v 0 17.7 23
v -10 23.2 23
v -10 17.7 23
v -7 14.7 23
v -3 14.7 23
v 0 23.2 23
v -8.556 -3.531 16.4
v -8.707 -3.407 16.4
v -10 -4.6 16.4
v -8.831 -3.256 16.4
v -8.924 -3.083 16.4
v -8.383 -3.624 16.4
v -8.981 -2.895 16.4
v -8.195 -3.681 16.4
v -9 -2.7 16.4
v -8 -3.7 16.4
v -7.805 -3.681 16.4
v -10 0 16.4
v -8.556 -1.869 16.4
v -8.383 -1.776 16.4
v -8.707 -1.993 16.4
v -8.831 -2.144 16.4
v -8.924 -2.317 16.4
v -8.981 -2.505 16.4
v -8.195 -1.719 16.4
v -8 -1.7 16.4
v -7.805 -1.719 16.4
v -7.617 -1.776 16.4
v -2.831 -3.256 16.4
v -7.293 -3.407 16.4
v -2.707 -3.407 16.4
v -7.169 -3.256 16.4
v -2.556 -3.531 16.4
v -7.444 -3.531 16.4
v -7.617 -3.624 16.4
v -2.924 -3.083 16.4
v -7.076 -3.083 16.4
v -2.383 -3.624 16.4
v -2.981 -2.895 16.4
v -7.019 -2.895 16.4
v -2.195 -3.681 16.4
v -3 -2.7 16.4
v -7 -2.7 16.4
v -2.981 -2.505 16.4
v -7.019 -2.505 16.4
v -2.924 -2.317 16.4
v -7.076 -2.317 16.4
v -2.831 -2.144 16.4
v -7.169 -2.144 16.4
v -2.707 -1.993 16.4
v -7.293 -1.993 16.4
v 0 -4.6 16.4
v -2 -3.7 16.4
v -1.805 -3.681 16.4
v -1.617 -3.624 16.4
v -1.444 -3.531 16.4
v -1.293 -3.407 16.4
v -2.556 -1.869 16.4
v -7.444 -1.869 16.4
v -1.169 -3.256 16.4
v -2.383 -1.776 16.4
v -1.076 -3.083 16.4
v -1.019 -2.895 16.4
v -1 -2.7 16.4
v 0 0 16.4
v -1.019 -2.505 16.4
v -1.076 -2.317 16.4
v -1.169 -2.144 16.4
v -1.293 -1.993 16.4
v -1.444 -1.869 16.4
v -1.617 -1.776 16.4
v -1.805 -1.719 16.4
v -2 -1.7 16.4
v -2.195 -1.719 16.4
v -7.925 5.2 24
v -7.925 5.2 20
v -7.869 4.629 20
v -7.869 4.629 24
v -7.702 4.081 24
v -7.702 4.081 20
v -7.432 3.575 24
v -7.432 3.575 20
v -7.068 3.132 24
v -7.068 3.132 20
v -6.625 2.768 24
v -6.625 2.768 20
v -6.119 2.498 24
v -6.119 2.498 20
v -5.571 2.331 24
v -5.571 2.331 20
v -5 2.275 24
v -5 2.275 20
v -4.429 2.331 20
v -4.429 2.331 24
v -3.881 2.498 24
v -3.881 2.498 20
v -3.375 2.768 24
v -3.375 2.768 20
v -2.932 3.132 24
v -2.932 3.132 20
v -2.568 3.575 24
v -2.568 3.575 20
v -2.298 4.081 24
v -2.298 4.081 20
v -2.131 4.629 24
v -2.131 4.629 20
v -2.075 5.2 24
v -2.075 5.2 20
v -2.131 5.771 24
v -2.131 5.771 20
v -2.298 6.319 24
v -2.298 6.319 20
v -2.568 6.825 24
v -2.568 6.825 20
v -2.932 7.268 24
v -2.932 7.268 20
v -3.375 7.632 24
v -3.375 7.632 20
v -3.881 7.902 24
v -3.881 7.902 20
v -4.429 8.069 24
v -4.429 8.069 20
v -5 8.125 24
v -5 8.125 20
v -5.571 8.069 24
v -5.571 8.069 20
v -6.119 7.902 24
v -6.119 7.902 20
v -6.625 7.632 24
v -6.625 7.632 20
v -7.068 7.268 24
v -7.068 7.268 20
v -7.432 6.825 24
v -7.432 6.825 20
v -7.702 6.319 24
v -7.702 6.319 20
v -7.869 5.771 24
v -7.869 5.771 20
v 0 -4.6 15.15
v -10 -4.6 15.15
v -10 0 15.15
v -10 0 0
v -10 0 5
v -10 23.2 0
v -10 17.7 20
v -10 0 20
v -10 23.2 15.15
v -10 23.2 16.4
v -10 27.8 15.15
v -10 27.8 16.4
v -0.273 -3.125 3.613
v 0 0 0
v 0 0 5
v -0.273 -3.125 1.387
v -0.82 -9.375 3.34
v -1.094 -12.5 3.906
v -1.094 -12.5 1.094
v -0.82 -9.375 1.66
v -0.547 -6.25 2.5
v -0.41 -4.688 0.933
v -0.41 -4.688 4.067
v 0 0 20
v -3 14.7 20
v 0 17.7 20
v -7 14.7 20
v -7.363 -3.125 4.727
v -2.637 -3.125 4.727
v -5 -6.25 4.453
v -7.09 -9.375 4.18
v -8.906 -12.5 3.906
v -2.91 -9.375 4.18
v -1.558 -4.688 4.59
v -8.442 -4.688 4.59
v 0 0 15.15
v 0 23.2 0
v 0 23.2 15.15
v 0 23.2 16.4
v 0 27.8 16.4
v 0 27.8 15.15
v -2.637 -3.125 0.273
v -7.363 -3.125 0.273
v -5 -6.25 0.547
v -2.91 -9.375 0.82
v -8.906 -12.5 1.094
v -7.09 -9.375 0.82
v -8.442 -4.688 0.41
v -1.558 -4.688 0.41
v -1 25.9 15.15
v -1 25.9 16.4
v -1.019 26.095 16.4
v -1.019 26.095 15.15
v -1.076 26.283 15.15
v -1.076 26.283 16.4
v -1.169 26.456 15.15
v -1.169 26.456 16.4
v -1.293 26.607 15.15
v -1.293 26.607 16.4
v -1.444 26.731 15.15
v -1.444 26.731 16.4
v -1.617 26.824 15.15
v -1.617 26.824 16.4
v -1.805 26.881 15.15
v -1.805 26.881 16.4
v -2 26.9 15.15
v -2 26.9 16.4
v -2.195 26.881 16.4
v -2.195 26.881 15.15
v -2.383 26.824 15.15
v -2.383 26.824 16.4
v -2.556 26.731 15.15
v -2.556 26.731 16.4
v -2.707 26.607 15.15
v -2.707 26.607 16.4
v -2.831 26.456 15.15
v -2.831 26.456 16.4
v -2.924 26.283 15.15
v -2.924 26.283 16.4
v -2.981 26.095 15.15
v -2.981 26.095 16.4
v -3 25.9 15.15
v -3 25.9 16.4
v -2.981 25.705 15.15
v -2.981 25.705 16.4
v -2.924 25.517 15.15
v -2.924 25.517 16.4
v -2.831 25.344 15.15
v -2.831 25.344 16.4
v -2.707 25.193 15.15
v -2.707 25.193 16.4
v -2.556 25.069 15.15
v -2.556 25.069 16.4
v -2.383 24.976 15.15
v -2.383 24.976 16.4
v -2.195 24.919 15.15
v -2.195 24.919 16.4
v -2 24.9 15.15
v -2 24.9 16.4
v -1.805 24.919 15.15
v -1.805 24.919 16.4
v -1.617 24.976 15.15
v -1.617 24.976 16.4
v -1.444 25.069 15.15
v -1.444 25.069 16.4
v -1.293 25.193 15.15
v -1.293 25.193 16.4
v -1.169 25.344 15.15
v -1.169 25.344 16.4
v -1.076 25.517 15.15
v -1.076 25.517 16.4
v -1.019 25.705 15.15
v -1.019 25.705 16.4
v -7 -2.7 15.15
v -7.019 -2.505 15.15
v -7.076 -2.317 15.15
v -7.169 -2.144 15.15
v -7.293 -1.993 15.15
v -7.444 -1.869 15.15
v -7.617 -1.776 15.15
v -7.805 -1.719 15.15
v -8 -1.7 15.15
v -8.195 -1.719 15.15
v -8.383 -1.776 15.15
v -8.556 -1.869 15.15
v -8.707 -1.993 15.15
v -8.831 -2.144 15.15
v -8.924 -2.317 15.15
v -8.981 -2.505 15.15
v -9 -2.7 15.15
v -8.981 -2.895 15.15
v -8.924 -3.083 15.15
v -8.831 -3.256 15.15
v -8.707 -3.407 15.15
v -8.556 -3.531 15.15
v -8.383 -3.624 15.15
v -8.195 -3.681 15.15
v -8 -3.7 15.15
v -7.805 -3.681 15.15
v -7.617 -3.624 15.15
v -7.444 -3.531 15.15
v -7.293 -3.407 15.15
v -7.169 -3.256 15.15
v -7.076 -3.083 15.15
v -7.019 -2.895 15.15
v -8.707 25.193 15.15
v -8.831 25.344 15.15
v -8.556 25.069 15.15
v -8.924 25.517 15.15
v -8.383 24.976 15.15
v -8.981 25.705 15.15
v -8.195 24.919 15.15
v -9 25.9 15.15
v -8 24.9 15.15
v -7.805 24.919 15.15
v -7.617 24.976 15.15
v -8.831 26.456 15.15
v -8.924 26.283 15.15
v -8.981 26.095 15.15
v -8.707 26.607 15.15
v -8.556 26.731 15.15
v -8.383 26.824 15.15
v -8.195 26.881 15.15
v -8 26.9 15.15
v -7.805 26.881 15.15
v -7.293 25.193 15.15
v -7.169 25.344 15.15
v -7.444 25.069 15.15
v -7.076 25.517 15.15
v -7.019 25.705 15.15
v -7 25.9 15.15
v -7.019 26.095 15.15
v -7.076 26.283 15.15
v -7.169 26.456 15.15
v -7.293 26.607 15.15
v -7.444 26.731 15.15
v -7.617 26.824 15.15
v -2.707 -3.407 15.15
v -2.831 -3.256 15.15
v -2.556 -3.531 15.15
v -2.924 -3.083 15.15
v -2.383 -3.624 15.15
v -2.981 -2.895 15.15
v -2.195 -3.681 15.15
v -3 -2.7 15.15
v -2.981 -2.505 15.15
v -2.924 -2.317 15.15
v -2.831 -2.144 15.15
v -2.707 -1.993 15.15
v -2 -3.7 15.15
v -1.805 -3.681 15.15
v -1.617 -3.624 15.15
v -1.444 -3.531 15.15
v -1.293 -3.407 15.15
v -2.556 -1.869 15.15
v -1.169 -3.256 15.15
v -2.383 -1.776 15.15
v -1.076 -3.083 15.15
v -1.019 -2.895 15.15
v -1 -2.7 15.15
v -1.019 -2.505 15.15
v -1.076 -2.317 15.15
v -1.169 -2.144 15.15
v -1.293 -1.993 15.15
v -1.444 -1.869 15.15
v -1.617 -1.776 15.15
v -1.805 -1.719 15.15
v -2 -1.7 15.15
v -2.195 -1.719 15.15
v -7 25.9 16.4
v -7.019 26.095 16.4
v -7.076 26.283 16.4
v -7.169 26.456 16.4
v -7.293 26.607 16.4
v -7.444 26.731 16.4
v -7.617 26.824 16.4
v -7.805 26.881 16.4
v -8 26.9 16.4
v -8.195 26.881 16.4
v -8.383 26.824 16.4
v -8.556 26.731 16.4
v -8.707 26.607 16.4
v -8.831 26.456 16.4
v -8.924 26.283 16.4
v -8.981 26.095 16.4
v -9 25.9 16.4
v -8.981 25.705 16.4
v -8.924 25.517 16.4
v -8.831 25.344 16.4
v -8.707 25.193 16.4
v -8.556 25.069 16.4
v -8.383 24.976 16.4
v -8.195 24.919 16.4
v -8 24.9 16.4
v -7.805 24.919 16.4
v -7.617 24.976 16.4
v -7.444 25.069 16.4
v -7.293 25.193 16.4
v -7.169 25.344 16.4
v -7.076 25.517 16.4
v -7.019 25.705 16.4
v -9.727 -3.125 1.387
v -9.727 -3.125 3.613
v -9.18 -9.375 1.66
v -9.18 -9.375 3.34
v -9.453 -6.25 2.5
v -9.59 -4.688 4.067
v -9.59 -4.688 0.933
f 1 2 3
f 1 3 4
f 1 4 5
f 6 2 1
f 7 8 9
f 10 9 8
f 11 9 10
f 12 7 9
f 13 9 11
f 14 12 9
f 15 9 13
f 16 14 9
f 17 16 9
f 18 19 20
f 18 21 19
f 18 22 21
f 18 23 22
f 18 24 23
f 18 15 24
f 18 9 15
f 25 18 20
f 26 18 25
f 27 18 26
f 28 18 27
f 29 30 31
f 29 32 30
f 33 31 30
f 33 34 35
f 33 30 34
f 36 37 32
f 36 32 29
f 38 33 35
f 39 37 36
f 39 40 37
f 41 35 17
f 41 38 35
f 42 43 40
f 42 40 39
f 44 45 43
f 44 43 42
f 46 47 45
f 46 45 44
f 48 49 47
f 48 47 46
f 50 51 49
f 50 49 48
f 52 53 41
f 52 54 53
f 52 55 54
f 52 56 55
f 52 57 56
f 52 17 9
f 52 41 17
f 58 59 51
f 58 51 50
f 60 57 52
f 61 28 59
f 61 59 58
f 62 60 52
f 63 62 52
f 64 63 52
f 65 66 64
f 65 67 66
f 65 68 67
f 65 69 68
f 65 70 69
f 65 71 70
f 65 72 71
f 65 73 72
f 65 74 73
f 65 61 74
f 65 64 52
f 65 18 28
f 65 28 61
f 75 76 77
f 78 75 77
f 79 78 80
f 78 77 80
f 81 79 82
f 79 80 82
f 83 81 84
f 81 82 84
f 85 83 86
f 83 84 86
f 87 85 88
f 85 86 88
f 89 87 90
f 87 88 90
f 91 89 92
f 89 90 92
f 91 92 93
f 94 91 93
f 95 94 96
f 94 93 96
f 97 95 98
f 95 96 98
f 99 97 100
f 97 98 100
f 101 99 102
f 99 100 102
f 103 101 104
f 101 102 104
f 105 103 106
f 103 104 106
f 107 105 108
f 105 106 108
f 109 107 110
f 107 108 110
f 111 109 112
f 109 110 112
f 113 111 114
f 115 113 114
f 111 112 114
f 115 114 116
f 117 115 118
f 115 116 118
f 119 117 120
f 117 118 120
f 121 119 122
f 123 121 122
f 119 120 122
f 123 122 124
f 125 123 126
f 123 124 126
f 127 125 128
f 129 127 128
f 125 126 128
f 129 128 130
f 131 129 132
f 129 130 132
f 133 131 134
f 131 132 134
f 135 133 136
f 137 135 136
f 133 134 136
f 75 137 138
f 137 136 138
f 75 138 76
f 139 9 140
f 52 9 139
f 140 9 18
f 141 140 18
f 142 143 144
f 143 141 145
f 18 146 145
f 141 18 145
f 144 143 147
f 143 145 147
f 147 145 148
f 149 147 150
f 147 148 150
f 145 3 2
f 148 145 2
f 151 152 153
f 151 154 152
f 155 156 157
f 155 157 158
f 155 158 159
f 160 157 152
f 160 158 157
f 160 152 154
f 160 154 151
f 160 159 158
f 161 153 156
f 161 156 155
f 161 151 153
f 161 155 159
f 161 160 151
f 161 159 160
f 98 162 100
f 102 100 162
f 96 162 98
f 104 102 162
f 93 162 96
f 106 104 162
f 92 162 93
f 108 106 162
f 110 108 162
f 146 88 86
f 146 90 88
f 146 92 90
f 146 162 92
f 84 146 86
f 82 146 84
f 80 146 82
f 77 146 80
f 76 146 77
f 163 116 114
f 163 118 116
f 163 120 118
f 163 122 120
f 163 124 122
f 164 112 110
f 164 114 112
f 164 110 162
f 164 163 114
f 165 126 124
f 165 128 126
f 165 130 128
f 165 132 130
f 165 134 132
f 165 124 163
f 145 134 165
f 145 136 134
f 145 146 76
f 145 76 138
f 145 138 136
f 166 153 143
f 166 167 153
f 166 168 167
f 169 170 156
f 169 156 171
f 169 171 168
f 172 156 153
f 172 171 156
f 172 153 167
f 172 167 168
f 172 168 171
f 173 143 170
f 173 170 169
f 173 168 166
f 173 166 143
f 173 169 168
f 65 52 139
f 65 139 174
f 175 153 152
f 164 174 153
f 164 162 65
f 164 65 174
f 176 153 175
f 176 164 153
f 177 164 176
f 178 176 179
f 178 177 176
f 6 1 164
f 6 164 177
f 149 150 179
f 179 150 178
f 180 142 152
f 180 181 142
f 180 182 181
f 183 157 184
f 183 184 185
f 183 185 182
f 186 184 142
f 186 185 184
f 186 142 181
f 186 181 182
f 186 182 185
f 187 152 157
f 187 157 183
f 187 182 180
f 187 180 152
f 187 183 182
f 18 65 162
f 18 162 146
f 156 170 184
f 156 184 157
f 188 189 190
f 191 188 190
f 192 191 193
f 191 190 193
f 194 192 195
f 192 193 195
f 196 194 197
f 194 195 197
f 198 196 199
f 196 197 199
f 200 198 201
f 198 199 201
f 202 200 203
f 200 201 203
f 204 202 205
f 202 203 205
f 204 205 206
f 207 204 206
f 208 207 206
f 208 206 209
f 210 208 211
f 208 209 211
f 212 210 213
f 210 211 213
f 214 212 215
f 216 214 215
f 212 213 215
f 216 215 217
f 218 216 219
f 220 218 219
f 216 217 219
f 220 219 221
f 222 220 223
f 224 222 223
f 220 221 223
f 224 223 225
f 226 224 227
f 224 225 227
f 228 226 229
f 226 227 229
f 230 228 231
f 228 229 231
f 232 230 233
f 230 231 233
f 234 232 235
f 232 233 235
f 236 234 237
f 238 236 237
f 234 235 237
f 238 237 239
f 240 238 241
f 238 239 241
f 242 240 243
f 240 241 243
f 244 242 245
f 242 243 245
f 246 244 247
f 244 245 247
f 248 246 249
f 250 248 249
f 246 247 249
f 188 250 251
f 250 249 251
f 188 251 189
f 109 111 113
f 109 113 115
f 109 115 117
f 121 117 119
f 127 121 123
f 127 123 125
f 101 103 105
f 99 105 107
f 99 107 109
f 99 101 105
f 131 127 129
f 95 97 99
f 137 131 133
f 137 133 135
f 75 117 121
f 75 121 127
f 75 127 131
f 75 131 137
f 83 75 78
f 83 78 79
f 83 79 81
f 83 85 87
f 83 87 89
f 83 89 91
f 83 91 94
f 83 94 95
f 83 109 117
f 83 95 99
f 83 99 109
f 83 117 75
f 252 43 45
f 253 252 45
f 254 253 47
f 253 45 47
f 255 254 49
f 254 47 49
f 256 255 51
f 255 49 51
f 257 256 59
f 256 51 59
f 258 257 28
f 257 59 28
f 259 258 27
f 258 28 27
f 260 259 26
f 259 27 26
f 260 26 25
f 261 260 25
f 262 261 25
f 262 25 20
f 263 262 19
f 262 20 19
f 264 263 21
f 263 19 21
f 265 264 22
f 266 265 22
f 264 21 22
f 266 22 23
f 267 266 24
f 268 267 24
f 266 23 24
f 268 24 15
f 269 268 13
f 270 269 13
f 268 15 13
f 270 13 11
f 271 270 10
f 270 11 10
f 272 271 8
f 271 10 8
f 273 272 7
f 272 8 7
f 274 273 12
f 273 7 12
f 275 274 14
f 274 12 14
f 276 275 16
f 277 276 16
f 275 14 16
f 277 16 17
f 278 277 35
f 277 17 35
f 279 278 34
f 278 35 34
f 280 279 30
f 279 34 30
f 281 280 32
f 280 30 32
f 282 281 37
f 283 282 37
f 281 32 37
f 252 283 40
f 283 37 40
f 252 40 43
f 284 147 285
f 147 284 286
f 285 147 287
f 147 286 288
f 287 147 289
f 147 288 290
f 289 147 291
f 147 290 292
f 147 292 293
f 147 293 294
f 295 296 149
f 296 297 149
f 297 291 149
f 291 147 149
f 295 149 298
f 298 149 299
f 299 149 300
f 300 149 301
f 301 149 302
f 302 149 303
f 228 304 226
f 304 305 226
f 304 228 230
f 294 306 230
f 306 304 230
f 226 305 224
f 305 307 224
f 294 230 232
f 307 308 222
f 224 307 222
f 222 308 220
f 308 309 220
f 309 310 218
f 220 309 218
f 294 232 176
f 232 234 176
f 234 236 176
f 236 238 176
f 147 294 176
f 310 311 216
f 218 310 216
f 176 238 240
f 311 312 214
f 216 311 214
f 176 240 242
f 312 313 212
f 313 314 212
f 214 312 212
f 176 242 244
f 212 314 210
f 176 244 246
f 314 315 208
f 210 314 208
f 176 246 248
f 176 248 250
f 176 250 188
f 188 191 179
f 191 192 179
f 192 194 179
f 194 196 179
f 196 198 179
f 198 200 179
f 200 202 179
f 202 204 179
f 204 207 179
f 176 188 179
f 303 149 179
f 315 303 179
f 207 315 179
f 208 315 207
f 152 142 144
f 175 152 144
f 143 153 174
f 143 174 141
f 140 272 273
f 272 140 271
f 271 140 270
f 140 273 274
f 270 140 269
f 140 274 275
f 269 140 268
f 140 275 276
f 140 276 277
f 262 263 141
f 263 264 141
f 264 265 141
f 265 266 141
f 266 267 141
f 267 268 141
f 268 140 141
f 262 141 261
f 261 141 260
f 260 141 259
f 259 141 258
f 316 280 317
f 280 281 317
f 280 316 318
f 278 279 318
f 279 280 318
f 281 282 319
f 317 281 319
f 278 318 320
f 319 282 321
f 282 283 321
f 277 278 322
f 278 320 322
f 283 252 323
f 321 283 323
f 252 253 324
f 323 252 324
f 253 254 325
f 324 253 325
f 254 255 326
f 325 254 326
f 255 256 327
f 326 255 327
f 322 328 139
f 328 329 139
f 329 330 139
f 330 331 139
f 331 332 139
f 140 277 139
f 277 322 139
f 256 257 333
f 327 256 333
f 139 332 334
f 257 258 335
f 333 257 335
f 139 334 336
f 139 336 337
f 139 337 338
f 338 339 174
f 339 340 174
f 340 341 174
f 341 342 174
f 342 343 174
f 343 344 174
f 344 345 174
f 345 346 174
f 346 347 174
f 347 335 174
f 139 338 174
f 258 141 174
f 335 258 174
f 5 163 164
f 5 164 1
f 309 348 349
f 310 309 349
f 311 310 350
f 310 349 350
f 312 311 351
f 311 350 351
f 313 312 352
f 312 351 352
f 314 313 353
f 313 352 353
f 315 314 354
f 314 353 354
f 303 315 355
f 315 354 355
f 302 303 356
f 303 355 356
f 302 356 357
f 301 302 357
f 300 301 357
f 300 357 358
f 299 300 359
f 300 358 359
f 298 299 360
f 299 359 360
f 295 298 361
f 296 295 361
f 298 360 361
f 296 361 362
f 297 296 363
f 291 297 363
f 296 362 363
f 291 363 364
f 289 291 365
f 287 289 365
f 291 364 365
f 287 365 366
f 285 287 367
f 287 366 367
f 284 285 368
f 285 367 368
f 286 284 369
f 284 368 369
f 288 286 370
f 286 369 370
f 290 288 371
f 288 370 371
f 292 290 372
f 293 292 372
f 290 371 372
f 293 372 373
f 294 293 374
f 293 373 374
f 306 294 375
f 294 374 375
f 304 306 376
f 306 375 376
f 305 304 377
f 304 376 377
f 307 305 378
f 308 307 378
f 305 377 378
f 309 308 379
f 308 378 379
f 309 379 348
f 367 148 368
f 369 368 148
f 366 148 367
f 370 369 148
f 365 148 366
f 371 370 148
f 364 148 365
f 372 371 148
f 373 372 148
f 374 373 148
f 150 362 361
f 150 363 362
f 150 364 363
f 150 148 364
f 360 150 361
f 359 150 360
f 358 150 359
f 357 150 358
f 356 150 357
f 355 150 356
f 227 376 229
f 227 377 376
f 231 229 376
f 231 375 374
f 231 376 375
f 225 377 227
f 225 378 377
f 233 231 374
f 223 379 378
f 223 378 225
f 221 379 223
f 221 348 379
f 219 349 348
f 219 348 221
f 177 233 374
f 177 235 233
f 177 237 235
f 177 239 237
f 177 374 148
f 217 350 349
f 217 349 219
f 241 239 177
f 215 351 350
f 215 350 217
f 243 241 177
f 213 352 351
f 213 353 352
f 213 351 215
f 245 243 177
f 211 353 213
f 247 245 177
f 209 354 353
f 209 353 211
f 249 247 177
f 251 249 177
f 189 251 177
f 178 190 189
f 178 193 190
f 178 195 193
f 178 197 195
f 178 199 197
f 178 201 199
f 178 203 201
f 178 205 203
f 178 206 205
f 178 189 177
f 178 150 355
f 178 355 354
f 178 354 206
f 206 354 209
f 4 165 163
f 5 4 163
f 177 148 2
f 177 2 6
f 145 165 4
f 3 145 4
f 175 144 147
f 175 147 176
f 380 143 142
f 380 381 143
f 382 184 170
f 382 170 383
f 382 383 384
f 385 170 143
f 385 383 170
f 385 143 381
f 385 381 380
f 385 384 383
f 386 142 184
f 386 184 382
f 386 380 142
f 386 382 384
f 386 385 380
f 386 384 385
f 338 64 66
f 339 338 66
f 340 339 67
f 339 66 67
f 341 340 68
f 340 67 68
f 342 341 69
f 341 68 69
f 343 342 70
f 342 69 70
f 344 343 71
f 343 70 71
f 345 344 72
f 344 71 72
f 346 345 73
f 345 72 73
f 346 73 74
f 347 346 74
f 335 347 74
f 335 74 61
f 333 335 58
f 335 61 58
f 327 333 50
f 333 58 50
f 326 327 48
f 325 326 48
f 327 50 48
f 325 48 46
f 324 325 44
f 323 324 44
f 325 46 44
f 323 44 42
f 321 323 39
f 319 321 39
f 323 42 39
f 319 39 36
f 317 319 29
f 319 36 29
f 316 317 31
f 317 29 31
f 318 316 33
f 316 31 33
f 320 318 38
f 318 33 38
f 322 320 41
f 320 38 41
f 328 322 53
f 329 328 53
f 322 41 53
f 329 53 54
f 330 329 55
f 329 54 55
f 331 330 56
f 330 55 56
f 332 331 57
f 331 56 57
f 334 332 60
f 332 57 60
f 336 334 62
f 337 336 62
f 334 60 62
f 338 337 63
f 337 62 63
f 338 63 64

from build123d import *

# Parameters (mm, degrees)
SKETCH1_W           = 23.2
SKETCH1_H           = 10
BOSS_EXTRUDE1_DEPTH = 20
SKETCH2_W           = 10
SKETCH2_H           = 8.5
BOSS_EXTRUDE2_DEPTH = 3
CHAMFER1_SIZE       = 3
SKETCH3_R           = 2.925
BOSS_EXTRUDE3_DEPTH = 4
BOSS_EXTRUDE4_START = -3.6
SKETCH5_W           = 10
SKETCH5_H           = 32.4
BOSS_EXTRUDE4_DEPTH = 1.25
SKETCH6_R           = 1
CUT_EXTRUDE1_DEPTH  = 1.25
SKETCH7_W           = 10
SKETCH7_H           = 5
BOSS_EXTRUDE5_DEPTH = 12.5
BOSS_EXTRUDE5_TAPER = 5


with BuildPart() as part:
    # Sketch1 → Boss-Extrude1 (new body)
    with BuildSketch(Plane(origin=(0, 0, 0), x_dir=(0, 1, 0), z_dir=(0, 0, 1))):
        with Locations((11.6, 5)):
            Rectangle(SKETCH1_W, SKETCH1_H)
    extrude(amount=BOSS_EXTRUDE1_DEPTH)

    # Sketch2 → Boss-Extrude2 (add)
    with BuildSketch(Plane.XY.offset(20)):
        with Locations((-5, 18.95)):
            Rectangle(SKETCH2_W, SKETCH2_H)
    extrude(amount=BOSS_EXTRUDE2_DEPTH)

    # Chamfer1
    chamfer1_edges = [part.edges().sort_by_distance(p)[0] for p in [
        (-10, 14.7, 21.5),
        (0, 14.7, 21.5),
    ]]
    chamfer(chamfer1_edges, length=CHAMFER1_SIZE)

    # Sketch3 → Boss-Extrude3 (add)
    with BuildSketch(Plane.XY.offset(20)):
        with Locations(Location((-5, 5.2, 0), (0, 0, 180))):
            Circle(SKETCH3_R)
    extrude(amount=BOSS_EXTRUDE3_DEPTH)

    # Sketch5 → Boss-Extrude4 (add)
    with BuildSketch(Plane.XY.offset(20).offset(BOSS_EXTRUDE4_START)):
        with Locations((-5, 11.6)):
            Rectangle(SKETCH5_W, SKETCH5_H)
    extrude(amount=-BOSS_EXTRUDE4_DEPTH)

    # Sketch6 → Cut-Extrude1 (cut)
    with BuildSketch(Plane.XY.offset(16.4)):
        with Locations((-8, -2.7)):
            Circle(SKETCH6_R)
        with Locations((-2, -2.7)):
            Circle(SKETCH6_R)
        with Locations((-8, 25.9)):
            Circle(SKETCH6_R)
        with Locations((-2, 25.9)):
            Circle(SKETCH6_R)
    extrude(amount=-CUT_EXTRUDE1_DEPTH, mode=Mode.SUBTRACT)

    # Sketch7 → Boss-Extrude5 (add)
    with BuildSketch(Plane.XZ):
        with Locations((-5, 2.5)):
            Rectangle(SKETCH7_W, SKETCH7_H)
    extrude(amount=BOSS_EXTRUDE5_DEPTH, taper=BOSS_EXTRUDE5_TAPER)


solid = part.part
